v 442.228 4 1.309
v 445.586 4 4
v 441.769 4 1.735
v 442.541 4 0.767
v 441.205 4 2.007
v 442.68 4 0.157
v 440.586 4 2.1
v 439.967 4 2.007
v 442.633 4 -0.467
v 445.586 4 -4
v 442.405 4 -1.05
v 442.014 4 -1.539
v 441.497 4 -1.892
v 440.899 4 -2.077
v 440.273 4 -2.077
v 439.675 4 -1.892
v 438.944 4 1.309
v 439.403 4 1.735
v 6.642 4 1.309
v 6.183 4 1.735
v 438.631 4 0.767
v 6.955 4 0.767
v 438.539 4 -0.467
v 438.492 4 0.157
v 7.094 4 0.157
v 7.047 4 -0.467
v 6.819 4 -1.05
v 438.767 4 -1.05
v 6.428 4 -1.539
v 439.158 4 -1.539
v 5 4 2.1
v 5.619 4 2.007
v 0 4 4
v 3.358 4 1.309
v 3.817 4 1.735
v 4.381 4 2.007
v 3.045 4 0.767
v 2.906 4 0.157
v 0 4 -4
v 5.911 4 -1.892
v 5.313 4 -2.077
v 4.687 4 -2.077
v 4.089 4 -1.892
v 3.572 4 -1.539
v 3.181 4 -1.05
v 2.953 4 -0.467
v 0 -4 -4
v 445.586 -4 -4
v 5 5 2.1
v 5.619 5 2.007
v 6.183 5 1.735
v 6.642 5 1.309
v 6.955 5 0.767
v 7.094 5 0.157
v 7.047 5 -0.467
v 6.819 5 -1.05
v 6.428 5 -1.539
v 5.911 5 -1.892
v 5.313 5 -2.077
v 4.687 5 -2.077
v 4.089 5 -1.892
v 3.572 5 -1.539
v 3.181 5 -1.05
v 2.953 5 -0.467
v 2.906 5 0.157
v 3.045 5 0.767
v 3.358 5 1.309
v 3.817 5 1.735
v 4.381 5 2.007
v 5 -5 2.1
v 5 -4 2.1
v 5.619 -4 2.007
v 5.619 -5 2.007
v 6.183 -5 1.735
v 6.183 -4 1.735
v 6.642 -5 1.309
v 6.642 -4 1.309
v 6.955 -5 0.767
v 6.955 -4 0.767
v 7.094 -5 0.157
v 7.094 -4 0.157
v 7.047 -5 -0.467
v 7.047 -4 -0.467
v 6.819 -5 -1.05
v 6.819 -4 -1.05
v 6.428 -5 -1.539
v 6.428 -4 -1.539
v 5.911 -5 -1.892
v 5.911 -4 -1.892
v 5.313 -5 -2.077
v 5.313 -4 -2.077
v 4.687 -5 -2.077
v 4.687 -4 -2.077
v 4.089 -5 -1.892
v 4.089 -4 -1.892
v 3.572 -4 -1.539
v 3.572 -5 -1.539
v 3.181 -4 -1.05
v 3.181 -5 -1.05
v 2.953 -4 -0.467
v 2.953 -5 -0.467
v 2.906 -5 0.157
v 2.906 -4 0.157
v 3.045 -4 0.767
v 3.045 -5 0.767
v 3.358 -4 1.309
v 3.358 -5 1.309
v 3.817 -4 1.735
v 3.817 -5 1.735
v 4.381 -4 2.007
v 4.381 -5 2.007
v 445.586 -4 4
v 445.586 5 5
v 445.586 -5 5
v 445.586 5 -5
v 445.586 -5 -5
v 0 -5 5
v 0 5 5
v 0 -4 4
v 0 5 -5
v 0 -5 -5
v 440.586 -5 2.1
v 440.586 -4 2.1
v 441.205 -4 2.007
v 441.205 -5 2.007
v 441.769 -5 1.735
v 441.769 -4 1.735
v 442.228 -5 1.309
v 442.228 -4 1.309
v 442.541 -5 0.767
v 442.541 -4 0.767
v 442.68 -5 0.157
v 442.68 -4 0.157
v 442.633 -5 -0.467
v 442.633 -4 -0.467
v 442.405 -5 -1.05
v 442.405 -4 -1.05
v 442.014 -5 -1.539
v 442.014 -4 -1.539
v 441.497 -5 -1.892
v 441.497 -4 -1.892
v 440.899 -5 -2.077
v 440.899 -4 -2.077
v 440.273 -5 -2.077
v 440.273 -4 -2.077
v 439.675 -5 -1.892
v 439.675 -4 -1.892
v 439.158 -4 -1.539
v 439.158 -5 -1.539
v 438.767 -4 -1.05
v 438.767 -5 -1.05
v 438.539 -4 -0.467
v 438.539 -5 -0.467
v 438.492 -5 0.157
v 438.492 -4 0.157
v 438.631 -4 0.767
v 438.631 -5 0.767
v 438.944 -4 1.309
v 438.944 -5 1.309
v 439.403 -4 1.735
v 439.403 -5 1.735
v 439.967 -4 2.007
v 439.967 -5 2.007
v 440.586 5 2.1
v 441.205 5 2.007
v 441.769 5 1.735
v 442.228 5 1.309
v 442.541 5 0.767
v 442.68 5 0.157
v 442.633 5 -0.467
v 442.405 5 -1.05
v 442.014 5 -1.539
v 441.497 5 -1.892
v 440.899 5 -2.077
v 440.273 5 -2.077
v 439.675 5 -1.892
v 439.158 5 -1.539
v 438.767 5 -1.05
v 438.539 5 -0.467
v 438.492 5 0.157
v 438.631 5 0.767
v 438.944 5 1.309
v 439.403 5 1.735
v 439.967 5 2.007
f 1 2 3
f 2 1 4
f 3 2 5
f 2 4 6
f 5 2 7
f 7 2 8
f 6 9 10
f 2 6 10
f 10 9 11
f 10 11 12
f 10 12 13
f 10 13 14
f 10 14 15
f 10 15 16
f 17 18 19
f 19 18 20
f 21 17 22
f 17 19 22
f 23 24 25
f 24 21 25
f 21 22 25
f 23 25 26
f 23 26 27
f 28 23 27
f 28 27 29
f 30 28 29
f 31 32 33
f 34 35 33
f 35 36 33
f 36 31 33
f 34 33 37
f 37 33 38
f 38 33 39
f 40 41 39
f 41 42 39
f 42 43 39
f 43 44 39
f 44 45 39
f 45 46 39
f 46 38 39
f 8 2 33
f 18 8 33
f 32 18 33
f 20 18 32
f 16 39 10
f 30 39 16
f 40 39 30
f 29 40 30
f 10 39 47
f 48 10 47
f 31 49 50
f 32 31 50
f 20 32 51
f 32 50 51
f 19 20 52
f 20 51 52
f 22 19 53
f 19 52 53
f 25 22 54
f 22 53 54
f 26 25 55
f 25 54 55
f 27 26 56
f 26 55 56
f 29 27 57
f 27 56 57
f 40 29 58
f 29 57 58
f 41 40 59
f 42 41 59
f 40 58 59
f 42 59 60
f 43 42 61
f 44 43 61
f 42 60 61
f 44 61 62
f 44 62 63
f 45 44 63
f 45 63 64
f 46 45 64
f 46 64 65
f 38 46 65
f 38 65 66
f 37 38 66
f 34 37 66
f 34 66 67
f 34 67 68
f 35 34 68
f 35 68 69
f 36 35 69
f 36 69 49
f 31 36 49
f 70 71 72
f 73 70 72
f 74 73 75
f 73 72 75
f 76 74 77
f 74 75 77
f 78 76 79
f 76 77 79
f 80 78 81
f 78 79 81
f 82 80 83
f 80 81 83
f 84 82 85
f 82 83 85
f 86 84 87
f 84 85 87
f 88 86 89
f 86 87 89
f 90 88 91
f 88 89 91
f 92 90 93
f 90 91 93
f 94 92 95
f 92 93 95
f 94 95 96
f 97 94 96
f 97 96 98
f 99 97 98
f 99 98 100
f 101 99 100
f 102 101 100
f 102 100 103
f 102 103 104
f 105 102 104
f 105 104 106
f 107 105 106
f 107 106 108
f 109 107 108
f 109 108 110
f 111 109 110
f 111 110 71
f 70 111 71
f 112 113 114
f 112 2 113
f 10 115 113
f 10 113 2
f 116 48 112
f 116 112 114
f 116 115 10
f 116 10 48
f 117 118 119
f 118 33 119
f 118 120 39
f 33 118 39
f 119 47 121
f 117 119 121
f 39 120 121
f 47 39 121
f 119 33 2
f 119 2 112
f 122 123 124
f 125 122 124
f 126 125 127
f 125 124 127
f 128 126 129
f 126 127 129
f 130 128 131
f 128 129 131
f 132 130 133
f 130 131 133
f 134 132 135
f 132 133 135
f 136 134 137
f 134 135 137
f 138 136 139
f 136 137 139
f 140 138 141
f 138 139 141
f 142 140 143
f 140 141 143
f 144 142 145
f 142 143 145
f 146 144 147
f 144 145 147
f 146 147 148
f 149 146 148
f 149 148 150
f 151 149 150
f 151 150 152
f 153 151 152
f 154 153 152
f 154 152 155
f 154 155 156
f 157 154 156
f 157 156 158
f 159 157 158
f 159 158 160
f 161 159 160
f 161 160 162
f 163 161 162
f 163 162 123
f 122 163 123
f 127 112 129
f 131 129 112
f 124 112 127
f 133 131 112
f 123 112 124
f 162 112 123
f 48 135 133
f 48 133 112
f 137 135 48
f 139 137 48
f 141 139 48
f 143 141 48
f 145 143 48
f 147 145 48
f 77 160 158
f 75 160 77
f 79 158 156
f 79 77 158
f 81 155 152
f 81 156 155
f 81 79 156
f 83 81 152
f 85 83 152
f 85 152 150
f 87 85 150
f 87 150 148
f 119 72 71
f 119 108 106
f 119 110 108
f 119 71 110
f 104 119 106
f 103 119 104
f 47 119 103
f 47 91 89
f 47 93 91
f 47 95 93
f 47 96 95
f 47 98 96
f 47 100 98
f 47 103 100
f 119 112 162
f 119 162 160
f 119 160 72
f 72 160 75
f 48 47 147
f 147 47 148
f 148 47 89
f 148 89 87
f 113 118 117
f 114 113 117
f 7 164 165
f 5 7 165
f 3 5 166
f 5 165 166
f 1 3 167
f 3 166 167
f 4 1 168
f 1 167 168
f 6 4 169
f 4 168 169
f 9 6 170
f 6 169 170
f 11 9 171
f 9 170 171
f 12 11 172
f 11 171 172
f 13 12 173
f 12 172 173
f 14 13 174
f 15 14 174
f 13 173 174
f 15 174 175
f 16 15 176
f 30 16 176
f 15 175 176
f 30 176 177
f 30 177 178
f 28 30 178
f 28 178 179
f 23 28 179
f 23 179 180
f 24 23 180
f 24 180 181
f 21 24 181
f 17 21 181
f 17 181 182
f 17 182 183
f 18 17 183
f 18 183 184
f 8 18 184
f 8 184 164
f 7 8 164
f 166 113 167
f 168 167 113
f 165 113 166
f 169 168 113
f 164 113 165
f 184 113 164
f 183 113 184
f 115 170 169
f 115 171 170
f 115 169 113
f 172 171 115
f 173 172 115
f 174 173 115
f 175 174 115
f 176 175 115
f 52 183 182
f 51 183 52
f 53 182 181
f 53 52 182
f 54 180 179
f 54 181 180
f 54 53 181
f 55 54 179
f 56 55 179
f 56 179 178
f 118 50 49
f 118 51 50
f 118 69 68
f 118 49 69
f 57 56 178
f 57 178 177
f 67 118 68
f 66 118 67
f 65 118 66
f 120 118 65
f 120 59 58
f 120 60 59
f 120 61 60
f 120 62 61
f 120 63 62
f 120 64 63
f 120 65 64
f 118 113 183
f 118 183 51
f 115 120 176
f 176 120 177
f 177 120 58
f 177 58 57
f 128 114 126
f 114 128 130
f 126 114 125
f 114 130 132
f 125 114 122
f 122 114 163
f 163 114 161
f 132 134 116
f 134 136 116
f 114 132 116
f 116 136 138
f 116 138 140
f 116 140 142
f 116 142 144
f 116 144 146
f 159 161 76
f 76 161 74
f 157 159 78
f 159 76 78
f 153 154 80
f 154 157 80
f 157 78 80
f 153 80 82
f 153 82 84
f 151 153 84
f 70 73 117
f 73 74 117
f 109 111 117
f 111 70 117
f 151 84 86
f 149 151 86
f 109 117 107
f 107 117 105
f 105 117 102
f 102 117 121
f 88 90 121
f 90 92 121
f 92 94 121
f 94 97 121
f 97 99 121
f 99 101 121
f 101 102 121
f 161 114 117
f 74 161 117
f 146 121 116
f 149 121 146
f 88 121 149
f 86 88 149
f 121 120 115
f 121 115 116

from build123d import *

# Parameters (mm, degrees)
SKETCH_1_W          = 10
SKETCH_1_H          = 10
SKETCH_1_W_2        = 8
SKETCH_1_H_2        = 8
EXTRUDE_1_DEPTH     = 445.586099411
SKETCH_2_R          = 2.1
CUT_EXTRUDE_1_DEPTH = 446.72634204


with BuildPart() as part:
    # ｽｹｯﾁ1 → 押し出し-薄板1 (new body)
    with BuildSketch(Plane(origin=(0, 0, 0), x_dir=(0, -1, 0), z_dir=(1, 0, 0))):
        Rectangle(SKETCH_1_W, SKETCH_1_H)
        Rectangle(SKETCH_1_W_2, SKETCH_1_H_2, mode=Mode.SUBTRACT)
    extrude(amount=EXTRUDE_1_DEPTH)

    # ｽｹｯﾁ2 → ｶｯﾄ - 押し出し1 (cut, through all)
    with BuildSketch(Plane(origin=(0, 5, 0), x_dir=(1, 0, 0), z_dir=(0, 1, 0))):
        with Locations(Location((5, 0, 0), (0, 0, 270))):
            Circle(SKETCH_2_R)
        with Locations(Location((440.586099411, 0, 0), (0, 0, 270))):
            Circle(SKETCH_2_R)
    extrude(amount=-CUT_EXTRUDE_1_DEPTH, mode=Mode.SUBTRACT)


solid = part.part
